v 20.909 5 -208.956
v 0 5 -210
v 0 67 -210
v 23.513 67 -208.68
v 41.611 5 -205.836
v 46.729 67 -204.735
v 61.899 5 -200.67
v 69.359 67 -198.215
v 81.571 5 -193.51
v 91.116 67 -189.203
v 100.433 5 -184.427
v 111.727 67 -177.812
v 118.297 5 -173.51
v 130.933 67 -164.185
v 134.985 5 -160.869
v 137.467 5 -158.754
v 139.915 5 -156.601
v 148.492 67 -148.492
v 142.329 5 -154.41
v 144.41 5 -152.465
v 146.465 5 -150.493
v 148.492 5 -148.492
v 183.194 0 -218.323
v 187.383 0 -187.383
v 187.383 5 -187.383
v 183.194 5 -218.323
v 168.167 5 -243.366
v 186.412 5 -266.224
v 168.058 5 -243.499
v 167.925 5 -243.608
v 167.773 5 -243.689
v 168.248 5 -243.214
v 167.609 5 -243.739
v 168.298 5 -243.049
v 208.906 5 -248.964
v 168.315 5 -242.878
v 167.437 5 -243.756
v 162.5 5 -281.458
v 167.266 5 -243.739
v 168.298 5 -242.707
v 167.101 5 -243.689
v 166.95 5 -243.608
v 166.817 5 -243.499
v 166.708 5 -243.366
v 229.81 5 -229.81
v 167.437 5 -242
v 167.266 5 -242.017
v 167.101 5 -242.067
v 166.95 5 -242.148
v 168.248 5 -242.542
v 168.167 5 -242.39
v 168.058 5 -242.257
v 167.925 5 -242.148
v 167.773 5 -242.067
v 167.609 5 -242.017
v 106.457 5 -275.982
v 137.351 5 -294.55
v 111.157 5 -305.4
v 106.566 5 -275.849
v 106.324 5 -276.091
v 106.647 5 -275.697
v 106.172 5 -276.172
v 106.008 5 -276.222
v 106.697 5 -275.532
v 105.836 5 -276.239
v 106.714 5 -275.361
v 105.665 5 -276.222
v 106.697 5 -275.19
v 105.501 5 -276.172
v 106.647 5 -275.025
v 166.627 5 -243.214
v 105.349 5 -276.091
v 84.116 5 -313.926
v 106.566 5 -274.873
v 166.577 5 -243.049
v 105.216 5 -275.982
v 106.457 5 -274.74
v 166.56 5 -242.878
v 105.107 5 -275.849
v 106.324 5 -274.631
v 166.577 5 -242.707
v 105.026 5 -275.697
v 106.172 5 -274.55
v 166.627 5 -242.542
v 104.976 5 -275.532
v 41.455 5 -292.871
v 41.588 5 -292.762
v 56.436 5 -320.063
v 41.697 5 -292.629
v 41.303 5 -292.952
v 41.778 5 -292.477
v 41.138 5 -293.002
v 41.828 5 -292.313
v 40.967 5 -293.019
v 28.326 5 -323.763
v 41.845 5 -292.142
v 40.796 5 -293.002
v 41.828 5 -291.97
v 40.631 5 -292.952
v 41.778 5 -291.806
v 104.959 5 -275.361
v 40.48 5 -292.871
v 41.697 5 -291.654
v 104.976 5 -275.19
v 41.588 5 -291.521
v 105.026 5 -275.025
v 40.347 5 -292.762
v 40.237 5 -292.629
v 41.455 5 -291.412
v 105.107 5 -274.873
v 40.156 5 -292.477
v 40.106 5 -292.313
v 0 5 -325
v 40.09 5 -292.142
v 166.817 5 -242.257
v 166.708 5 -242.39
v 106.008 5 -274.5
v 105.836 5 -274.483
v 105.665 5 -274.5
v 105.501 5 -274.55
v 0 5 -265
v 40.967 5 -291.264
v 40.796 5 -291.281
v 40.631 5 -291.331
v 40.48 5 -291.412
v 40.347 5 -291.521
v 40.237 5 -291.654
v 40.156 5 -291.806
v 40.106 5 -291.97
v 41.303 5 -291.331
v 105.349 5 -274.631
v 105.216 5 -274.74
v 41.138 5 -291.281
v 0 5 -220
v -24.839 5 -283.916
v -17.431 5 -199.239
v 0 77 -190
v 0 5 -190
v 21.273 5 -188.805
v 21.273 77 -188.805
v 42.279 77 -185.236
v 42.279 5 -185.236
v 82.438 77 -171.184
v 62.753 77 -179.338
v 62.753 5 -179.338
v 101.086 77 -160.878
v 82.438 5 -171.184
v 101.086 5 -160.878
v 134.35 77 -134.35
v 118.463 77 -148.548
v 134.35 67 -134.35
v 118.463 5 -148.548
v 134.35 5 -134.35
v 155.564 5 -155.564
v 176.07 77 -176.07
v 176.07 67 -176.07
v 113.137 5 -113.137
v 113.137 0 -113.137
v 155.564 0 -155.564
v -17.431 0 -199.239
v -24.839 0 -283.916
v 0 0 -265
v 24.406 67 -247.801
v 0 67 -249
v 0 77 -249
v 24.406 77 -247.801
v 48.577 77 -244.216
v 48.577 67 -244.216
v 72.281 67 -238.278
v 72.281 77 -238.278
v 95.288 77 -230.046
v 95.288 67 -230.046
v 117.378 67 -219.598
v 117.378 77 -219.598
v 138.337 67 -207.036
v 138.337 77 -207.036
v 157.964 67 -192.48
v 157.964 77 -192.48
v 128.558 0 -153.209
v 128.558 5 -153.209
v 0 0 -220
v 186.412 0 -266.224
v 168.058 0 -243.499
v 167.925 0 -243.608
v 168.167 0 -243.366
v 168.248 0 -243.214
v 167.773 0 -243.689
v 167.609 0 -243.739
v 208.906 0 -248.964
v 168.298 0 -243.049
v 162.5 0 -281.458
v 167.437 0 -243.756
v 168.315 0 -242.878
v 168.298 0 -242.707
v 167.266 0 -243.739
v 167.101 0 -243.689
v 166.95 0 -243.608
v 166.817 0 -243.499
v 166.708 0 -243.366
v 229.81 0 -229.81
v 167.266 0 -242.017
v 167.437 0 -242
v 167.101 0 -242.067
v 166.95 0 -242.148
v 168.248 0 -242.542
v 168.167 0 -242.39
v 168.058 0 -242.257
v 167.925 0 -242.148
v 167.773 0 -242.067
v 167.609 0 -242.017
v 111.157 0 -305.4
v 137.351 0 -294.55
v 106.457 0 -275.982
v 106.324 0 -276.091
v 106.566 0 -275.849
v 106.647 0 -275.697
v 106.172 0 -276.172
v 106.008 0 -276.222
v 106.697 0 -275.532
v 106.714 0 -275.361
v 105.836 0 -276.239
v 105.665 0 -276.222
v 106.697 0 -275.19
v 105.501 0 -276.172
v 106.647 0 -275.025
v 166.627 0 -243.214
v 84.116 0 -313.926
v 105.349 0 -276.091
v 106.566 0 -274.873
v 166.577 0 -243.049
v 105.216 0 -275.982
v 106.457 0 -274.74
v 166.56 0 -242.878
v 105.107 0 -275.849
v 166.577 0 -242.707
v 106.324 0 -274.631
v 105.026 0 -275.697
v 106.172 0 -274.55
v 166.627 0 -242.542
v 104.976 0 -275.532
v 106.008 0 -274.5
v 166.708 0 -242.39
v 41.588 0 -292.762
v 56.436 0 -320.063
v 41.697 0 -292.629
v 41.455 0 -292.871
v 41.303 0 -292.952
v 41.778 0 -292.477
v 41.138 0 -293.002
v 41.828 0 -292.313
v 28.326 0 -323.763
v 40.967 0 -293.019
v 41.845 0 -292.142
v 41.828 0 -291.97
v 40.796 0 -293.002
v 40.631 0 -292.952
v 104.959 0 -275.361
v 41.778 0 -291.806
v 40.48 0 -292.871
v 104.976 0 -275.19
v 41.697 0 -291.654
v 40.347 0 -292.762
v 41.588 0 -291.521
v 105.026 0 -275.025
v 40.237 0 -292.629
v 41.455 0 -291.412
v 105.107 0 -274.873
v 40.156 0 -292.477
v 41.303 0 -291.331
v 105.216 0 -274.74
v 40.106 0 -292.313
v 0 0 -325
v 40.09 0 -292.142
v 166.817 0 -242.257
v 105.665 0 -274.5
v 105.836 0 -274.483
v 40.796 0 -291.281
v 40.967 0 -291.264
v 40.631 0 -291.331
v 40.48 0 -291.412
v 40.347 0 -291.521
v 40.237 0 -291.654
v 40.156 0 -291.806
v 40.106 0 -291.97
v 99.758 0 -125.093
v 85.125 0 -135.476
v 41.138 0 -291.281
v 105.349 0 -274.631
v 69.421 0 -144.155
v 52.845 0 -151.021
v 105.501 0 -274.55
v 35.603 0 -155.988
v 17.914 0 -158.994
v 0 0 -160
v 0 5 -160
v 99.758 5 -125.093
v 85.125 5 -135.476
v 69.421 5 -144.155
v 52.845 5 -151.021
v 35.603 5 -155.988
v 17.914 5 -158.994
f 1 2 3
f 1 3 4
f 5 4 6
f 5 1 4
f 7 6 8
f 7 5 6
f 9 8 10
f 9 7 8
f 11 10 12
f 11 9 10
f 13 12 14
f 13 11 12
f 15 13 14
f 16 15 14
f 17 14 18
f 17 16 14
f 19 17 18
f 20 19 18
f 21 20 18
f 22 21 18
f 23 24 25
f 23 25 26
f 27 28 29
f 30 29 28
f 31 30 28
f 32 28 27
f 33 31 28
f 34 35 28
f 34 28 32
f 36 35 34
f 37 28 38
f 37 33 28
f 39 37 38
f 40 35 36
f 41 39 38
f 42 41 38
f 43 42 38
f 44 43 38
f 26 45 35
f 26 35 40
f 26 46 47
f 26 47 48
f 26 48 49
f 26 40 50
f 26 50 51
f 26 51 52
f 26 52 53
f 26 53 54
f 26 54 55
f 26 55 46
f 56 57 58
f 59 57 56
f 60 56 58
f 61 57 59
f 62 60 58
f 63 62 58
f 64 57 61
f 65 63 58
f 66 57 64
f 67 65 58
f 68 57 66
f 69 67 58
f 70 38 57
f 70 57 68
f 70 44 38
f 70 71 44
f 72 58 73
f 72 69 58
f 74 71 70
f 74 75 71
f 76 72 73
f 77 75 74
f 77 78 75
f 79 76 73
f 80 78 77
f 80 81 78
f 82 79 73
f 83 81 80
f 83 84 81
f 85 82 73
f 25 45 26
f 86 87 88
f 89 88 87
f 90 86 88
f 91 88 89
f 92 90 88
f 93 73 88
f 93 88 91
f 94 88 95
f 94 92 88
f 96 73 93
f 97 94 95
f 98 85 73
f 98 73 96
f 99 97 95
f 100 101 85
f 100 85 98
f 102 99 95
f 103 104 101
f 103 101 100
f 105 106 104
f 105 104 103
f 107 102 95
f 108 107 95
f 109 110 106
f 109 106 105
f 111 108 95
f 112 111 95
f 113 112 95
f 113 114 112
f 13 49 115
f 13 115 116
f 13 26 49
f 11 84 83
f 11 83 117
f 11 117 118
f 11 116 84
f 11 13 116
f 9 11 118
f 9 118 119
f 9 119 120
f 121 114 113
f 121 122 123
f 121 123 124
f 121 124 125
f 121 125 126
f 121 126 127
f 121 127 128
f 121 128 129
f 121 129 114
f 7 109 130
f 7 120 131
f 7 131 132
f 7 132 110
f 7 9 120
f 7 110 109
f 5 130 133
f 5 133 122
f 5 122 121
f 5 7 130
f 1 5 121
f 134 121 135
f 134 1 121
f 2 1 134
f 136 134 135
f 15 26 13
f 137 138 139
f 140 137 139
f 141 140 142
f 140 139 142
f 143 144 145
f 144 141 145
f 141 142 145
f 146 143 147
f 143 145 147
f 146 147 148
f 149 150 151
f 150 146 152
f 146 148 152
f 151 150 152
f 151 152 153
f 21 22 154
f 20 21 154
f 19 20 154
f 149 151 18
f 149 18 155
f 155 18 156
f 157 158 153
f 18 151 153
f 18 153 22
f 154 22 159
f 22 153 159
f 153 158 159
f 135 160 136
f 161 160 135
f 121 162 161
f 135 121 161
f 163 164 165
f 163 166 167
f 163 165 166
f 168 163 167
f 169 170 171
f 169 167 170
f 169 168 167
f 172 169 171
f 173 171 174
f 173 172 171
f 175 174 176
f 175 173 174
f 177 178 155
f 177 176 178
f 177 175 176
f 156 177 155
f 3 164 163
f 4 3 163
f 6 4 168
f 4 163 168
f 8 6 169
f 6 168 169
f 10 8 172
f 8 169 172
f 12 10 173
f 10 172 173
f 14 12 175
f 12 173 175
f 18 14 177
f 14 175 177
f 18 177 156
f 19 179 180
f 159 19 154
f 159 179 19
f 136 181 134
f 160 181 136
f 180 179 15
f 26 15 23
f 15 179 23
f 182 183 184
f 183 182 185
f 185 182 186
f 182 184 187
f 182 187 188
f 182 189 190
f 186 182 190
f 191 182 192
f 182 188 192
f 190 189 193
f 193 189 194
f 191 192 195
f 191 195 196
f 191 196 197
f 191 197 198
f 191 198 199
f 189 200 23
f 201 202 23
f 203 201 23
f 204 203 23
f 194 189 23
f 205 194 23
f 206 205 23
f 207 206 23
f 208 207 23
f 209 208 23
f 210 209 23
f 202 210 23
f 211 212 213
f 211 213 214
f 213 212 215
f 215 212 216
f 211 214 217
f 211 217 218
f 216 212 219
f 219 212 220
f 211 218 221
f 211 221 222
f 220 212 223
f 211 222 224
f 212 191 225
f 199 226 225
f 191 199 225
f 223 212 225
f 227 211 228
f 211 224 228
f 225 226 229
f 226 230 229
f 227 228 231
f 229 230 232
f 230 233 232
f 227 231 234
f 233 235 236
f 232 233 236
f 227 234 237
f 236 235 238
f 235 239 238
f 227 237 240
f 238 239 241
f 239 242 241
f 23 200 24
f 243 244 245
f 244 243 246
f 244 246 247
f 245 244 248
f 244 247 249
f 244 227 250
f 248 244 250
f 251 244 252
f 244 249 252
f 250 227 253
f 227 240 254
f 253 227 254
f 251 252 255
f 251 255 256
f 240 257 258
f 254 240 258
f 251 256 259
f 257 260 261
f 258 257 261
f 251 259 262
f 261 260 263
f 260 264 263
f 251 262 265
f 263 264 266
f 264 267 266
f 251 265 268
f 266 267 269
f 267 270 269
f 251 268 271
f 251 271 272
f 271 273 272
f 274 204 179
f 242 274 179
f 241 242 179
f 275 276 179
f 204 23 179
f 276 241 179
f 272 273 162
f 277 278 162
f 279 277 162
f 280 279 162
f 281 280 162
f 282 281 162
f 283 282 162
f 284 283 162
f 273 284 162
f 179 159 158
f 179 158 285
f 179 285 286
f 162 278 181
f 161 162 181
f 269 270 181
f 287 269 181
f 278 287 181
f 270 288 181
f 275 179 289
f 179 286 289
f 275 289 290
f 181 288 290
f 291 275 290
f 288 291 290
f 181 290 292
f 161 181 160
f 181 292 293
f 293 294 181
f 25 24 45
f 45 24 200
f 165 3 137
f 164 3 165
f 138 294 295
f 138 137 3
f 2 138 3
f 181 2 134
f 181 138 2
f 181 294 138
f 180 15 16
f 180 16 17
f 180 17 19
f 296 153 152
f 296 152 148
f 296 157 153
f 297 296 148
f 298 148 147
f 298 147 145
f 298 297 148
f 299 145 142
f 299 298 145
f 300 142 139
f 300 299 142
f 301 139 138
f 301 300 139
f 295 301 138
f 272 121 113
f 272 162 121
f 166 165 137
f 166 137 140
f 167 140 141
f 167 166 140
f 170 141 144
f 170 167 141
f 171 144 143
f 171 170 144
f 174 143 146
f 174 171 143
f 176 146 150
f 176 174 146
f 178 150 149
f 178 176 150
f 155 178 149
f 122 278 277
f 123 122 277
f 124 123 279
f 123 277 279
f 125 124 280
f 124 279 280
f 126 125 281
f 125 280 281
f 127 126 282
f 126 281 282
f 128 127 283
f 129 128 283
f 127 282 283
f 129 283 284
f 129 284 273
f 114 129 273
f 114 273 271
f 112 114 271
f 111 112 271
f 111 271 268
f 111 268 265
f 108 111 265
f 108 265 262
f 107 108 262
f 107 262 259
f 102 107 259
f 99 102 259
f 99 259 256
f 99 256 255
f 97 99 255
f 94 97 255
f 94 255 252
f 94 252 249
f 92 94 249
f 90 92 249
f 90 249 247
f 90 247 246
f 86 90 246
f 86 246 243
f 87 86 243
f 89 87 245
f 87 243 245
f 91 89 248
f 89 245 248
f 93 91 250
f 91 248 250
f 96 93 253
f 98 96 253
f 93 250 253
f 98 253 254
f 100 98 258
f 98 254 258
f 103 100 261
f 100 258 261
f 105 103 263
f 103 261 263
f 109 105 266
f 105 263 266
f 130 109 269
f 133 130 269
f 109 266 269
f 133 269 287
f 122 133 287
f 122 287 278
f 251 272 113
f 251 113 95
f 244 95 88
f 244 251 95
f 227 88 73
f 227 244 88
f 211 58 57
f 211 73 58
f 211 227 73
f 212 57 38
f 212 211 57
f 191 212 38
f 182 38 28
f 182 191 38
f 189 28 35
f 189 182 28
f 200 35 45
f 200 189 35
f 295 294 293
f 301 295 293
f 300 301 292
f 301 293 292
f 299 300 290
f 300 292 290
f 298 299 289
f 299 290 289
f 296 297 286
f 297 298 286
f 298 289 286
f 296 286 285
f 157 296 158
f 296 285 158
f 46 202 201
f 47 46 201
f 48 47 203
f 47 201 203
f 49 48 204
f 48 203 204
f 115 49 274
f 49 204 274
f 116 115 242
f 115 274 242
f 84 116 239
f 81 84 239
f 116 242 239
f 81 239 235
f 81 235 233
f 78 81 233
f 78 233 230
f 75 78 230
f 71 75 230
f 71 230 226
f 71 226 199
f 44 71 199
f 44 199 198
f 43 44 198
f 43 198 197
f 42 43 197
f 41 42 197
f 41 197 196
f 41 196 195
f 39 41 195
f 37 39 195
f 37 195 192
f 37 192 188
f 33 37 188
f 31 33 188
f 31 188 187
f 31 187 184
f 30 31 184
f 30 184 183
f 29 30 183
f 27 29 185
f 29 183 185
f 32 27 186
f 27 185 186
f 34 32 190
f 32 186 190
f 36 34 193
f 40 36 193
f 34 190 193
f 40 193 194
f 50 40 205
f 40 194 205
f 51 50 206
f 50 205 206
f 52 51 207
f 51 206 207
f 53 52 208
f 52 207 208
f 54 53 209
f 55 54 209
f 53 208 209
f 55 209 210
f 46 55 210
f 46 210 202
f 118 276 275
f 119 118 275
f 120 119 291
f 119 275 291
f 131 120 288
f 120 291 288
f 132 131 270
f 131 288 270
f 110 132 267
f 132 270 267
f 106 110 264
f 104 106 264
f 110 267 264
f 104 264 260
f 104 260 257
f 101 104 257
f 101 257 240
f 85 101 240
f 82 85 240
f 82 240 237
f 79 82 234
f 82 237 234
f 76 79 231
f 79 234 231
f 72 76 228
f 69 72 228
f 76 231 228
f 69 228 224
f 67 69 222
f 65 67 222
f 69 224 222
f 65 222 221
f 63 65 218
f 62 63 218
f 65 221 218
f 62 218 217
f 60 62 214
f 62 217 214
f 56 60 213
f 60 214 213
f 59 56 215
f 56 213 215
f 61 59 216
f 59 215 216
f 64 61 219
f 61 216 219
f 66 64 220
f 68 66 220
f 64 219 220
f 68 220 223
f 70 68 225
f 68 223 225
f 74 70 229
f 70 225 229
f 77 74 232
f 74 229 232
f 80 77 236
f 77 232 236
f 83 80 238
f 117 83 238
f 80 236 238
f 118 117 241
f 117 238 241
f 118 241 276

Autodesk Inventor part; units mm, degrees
ref_plane "YZ Plane" through (0, 0, 0) normal (1, 0, 0) x (0, 1, 0)
ref_plane "XZ Plane" through (0, 0, 0) normal (0, 1, 0) x (-1, 0, 0)
ref_plane "XY Plane" through (0, 0, 0) normal (0, 0, 1) x (1, 0, 0)
sketch "Sketch1" plane through (0, 0, 0) normal (0, 1, 0) x (-1, 0, 0)
  circle A0 centre (0, 0) radius 160
  circle A1 centre (0, 0) radius 325
  line L0 (0, 0) -> (0, -325)
  line L1 (0, 0) -> (-229.8097, -229.8097)
  line L2 (0, 0) -> (28.3256, -323.7633)
  line L3 (0, 0) -> (-208.906, -248.9644)
  circle A2 centre (0, 0) radius 285
  circle A3 centre (0, 0) radius 265
  circle A4 centre (0, 0) radius 200
  circle A5 centre (0, 0) radius 220
  line L4 (0, -220) -> (17.4311, -199.2389)
  line L5 (0, -265) -> (24.8394, -283.9155)
  line L6 (-128.5575, -153.2089) -> (-155.5635, -155.5635)
  line L7 (-187.3833, -187.3833) -> (-183.1945, -218.3227)
  point P0 (-113.1371, -113.1371)
  point P1 (0, -160)
  dimension "d0" = 650
  dimension "d1" = 320
  dimension "d2" = 45
  dimension "d13" = 40
  dimension "d14" = 40
  dimension "d15" = 20
  dimension "d16" = 20
  dimension "d17" = 5
  dimension "d18" = 5
extrude "Extrusion1" add sketch "Sketch1" along normal blind 5 contours A0 L3 A4 L1 | A0 L0 A4 L3 | A4 L6 L1 | L2 A5 L4 | A4 L0 A5 L3 | L2 A3 L0 A5 | L0 A3 L3 A5 | L7 A2 L1 | L2 L5 A3 | L0 A2 L3 A3 | A2 L3 A1 L1 | A2 L0 A1 L3
sketch "Sketch2" plane through (0, 5, 0) normal (0, 1, 0) x (1, 0, 0)
  arc A0 (229.8097, 229.8097) -> (0, 325) centre (0, 0) ccw projected
  line L0 (0, 325) -> (0, 265) projected
  arc A1 (113.1371, 113.1371) -> (0, 160) centre (0, 0) ccw projected
  line L1 (113.1371, 113.1371) -> (155.5635, 155.5635) projected
  circle A2 centre (0, 0) radius 190
  circle A3 centre (0, 0) radius 210
  line L2 (155.5635, 155.5635) -> (128.5575, 153.2089) projected
  line L3 (128.5575, 153.2089) -> (183.1945, 218.3227) projected
  line L4 (183.1945, 218.3227) -> (187.3833, 187.3833) projected
  line L5 (187.3833, 187.3833) -> (229.8097, 229.8097) projected
  line L6 (0, 265) -> (-24.8394, 283.9155) projected
  line L7 (-24.8394, 283.9155) -> (-17.4311, 199.2389) projected
  line L8 (-17.4311, 199.2389) -> (0, 220) projected
  line L9 (0, 220) -> (0, 160) projected
  point P0 (148.4924, 148.4924)
  point P1 (0, 210)
  point P2 (0, 190)
  point P3 (134.3503, 134.3503)
  point P4 (0, 190)
  point P5 (0, 210)
  point P6 (-8.542, 209.8262)
  point P7 (-18.3027, 209.2009)
  point P8 (142.3294, 154.4096)
  point P9 (134.9854, 160.8693)
  dimension "d5" = 420
  dimension "d6" = 20
extrude "Extrusion2" add sketch "Sketch2" along normal blind 62 contours L3 L2 A3 L1 A2 L9 | A3 L2 L3
sketch "Sketch3" plane through (0, 67, 0) normal (0, 1, 0) x (1, 0, 0)
  line L0 (134.3503, 134.3503) -> (148.4924, 148.4924) projected
  arc A0 (148.4924, 148.4924) -> (0, 210) centre (0, 0) ccw projected
  circle A1 centre (0, 0) radius 190
  circle A2 centre (0, 0) radius 249
  line L1 (0, 190) -> (0, 160) projected
  line L2 (113.1371, 113.1371) -> (134.3503, 134.3503) projected
  arc A3 (148.4924, 148.4924) -> (142.3294, 154.4096) centre (0, 0) ccw projected
  line L3 (148.4924, 148.4924) -> (155.5635, 155.5635) projected
  arc A4 (229.8097, 229.8097) -> (0, 325) centre (0, 0) ccw projected
  line L4 (0, 220) -> (0, 210) projected
  line L5 (-17.4311, 199.2389) -> (0, 220) projected
  line L6 (0, 325) -> (0, 265) projected
  arc A5 (134.9854, 160.8693) -> (0, 210) centre (0, 0) ccw projected
  line L7 (134.9854, 160.8693) -> (183.1945, 218.3227) projected
  line L8 (183.1945, 218.3227) -> (187.3833, 187.3833) projected
  line L9 (0, 265) -> (-24.8394, 283.9155) projected
  line L10 (-24.8394, 283.9155) -> (-17.4311, 199.2389) projected
  arc A6 (148.4924, 148.4924) -> (142.3294, 154.4096) centre (0, 0) ccw projected
  line L11 (-17.4311, 199.2389) -> (0, 220) projected
  arc A7 (134.9854, 160.8693) -> (0, 210) centre (0, 0) ccw projected
  line L12 (134.9854, 160.8693) -> (183.1945, 218.3227) projected
  line L13 (183.1945, 218.3227) -> (187.3833, 187.3833) projected
  arc A8 (229.8097, 229.8097) -> (0, 325) centre (0, 0) ccw projected
  line L14 (0, 325) -> (0, 265) projected
  line L15 (0, 265) -> (-24.8394, 283.9155) projected
  line L16 (-24.8394, 283.9155) -> (-17.4311, 199.2389) projected
  line L17 (187.3833, 187.3833) -> (229.8097, 229.8097) projected
  arc A9 (134.3503, 134.3503) -> (0, 190) centre (0, 0) ccw projected
  line L18 (0, 190) -> (0, 160) projected
  arc A10 (113.1371, 113.1371) -> (0, 160) centre (0, 0) ccw projected
  line L19 (113.1371, 113.1371) -> (134.3503, 134.3503) projected
  line L20 (155.5635, 155.5635) -> (142.3294, 154.4096) projected
  line L21 (187.3833, 187.3833) -> (229.8097, 229.8097) projected
  line L22 (0, 220) -> (0, 210) projected
  arc A11 (134.3503, 134.3503) -> (0, 190) centre (0, 0) ccw projected
  arc A12 (113.1371, 113.1371) -> (0, 160) centre (0, 0) ccw projected
  line L23 (148.4924, 148.4924) -> (155.5635, 155.5635) projected
  line L24 (155.5635, 155.5635) -> (142.3294, 154.4096) projected
  arc A13 (134.3503, 134.3503) -> (0, 190) centre (0, 0) ccw projected
  line L25 (0, 210) -> (0, 190) projected
  line L26 (0, 0) -> (229.8097, 229.8097)
  arc A14 (229.8097, 229.8097) -> (0, 325) centre (0, 0) ccw projected
  line L27 (0, 0) -> (0, 325)
  point P0 (176.0696, 176.0696)
  point P1 (0, 249)
  point P2 (-18.3027, 209.2009)
  point P3 (-21.7018, 248.0525)
  point P4 (160.0541, 190.7451)
  point P5 (0, 210)
  point P6 (-8.542, 209.8262)
  point P7 (0, 210)
  point P8 (0, 210)
  point P9 (176.0696, 176.0696)
  point P10 (0, 249)
  dimension "d12" = 59
extrude "Extrusion3" add sketch "Sketch3" along normal blind 10 contours A1 L25 A0 L0 | A0 L20 L3 | A0 L7 A2 L26 L20 | L4 L27 A2 L7 A0
sketch "Sketch5" plane through (0, 5, 0) normal (0, 1, 0) x (1, 0, 0)
  circle A0 centre (0, 0) radius 295
  arc A1 (134.9854, 160.8693) -> (0, 210) centre (0, 0) ccw projected
  line L0 (134.9854, 160.8693) -> (183.1945, 218.3227) projected
  line L1 (183.1945, 218.3227) -> (187.3833, 187.3833) projected
  line L2 (187.3833, 187.3833) -> (229.8097, 229.8097) projected
  arc A2 (229.8097, 229.8097) -> (0, 325) centre (0, 0) ccw projected
  line L3 (0, 325) -> (0, 265) projected
  line L4 (0, 265) -> (-24.8394, 283.9155) projected
  line L5 (-24.8394, 283.9155) -> (-17.4311, 199.2389) projected
  line L6 (-17.4311, 199.2389) -> (0, 220) projected
  line L7 (0, 220) -> (0, 210) projected
  point P0 (40.9671, 292.1416)
  point P1 (167.4373, 242.878)
  point P2 (105.8364, 275.361)
  dimension "d26" = 30
hole "Hole1" at (40.9671, 5, -292.1416) at (167.4373, 5, -242.878) at (105.8364, 5, -275.361) direction (0, -1, 0) diameter 1.7551 end through all thread size "2-64 UNF" class "2B" standard "ANSI Unified Screw Threads"
properties part number "Carousel Base Plate v2"
